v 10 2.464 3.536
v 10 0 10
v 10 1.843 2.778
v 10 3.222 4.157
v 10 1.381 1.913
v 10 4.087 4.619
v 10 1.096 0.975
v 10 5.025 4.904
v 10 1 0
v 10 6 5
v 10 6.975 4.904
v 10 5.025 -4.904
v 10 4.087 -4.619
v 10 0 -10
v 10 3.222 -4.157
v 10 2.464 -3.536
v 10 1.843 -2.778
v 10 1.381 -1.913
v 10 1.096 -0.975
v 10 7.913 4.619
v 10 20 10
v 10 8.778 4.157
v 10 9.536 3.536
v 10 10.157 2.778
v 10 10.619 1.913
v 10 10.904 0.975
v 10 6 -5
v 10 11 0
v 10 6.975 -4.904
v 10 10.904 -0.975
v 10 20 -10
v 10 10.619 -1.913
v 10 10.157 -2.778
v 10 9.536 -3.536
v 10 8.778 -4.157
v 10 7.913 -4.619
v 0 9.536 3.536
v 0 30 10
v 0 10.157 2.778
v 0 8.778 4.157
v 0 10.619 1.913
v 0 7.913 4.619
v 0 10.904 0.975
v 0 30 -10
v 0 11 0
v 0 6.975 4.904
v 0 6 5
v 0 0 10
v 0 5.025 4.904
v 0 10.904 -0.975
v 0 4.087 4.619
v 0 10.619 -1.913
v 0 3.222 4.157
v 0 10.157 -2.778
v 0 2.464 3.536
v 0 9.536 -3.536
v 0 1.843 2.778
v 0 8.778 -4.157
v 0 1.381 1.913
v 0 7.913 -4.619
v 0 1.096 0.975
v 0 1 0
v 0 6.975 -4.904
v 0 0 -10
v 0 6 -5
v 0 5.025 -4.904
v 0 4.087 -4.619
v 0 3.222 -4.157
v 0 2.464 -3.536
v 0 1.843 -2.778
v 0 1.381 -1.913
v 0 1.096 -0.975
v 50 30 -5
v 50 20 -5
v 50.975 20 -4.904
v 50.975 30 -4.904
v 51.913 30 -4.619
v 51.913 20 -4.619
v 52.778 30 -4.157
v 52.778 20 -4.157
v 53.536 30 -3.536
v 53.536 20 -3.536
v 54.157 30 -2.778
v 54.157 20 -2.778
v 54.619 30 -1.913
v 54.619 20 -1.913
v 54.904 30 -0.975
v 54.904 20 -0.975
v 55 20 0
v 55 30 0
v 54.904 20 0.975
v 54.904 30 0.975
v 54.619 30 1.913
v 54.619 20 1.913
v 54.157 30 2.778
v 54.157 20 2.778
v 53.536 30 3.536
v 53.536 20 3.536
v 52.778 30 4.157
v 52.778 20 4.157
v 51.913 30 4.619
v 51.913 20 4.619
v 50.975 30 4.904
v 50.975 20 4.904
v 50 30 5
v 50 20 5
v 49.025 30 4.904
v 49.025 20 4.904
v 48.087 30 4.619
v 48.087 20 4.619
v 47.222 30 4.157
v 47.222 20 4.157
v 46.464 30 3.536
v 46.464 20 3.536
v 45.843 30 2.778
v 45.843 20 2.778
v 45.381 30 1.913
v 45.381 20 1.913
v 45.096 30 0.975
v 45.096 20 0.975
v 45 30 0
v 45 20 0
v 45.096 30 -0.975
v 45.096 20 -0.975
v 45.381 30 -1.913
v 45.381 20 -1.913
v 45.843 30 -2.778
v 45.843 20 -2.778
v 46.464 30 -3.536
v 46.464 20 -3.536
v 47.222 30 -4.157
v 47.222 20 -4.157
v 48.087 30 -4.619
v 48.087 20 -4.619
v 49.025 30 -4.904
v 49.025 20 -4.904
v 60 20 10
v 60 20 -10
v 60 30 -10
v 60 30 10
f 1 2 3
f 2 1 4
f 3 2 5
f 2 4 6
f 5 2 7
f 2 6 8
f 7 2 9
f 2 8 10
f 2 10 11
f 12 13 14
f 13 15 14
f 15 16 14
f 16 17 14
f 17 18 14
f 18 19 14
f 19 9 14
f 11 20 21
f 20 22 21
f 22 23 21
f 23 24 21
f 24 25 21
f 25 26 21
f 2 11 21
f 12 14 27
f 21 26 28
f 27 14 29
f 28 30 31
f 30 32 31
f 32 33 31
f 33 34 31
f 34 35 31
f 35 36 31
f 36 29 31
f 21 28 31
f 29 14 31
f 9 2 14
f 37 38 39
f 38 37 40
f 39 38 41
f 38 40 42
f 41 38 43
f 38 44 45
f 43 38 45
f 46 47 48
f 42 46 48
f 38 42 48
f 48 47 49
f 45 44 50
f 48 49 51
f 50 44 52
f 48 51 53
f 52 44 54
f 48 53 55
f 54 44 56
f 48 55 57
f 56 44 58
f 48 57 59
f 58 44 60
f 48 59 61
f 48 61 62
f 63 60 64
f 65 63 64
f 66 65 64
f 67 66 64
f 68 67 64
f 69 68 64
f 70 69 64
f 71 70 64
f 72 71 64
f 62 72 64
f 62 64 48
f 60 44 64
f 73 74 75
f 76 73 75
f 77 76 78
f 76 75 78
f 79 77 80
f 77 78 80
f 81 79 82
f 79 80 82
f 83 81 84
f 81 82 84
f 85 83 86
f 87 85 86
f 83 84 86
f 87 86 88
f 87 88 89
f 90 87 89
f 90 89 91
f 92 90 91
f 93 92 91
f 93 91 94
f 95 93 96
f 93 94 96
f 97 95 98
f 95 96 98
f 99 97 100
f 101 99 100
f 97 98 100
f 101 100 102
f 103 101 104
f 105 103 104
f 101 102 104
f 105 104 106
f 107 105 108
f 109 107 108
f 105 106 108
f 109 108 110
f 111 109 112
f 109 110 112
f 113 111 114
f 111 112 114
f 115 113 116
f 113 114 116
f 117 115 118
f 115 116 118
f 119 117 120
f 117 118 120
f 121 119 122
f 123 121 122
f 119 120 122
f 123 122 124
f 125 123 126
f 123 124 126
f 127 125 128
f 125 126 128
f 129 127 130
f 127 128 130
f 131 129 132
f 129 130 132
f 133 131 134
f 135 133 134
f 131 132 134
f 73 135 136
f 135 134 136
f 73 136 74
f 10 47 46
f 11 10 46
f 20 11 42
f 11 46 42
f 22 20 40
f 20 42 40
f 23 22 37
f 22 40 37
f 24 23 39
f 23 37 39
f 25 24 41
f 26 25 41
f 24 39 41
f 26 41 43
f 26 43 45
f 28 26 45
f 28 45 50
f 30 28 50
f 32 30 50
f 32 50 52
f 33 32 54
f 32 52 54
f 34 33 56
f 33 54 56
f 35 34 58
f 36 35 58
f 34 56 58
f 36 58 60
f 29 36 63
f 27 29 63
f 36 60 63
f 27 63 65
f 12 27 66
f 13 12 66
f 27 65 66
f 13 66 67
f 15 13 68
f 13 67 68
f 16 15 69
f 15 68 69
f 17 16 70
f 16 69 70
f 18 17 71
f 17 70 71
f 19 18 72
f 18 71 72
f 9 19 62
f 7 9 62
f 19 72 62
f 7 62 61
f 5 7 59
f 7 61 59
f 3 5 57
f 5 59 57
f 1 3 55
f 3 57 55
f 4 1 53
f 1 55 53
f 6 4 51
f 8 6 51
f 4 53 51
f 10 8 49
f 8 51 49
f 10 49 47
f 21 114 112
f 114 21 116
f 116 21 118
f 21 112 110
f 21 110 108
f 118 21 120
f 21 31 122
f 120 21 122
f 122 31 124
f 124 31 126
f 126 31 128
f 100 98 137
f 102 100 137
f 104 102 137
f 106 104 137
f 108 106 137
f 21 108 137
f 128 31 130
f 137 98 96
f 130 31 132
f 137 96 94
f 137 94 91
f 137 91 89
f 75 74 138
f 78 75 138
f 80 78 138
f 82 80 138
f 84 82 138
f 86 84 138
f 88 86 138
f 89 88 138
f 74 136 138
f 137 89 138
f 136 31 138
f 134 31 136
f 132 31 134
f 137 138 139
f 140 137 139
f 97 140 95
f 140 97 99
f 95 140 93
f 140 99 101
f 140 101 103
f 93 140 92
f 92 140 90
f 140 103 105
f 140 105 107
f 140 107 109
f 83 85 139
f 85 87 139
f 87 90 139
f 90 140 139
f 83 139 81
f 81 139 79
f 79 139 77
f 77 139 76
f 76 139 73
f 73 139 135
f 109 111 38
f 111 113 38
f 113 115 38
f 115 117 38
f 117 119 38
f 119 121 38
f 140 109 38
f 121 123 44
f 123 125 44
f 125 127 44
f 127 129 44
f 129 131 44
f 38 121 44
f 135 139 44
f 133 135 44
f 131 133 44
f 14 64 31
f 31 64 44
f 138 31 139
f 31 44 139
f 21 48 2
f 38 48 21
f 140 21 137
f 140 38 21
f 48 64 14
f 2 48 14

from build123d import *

# Parameters (mm, degrees)
BOSS_EXTRU_1_DEPTH      = 10
BOSS_EXTRU_1_DEPTH_BACK = 10
ESQUISSE2_R             = 5
ENL_V_MAT_EXTRU_1_DEPTH = 10
ESQUISSE3_R             = 5
ENL_V_MAT_EXTRU_2_DEPTH = 10


with BuildPart() as part:
    # Esquisse1 → Boss.-Extru.1 (new, two sides: drawn at the far end of the back side and taken through both)
    with BuildSketch(Plane.XY.offset(-BOSS_EXTRU_1_DEPTH_BACK)):
        Polygon((0, 0), (10, 0), (10, 20), (60, 20), (60, 30), (0, 30), align=None)
    extrude(amount=BOSS_EXTRU_1_DEPTH + BOSS_EXTRU_1_DEPTH_BACK)

    # Esquisse2 → Enlèv. mat.-Extru.1 (cut)
    with BuildSketch(Plane.XZ.offset(-20)):
        with Locations((50, 0)):
            Circle(ESQUISSE2_R)
    extrude(amount=-ENL_V_MAT_EXTRU_1_DEPTH, mode=Mode.SUBTRACT)

    # Esquisse3 → Enlèv. mat.-Extru.2 (cut)
    with BuildSketch(Plane.ZY):
        with Locations((0, 6)):
            Circle(ESQUISSE3_R)
    extrude(amount=-ENL_V_MAT_EXTRU_2_DEPTH, mode=Mode.SUBTRACT)


solid = part.part
